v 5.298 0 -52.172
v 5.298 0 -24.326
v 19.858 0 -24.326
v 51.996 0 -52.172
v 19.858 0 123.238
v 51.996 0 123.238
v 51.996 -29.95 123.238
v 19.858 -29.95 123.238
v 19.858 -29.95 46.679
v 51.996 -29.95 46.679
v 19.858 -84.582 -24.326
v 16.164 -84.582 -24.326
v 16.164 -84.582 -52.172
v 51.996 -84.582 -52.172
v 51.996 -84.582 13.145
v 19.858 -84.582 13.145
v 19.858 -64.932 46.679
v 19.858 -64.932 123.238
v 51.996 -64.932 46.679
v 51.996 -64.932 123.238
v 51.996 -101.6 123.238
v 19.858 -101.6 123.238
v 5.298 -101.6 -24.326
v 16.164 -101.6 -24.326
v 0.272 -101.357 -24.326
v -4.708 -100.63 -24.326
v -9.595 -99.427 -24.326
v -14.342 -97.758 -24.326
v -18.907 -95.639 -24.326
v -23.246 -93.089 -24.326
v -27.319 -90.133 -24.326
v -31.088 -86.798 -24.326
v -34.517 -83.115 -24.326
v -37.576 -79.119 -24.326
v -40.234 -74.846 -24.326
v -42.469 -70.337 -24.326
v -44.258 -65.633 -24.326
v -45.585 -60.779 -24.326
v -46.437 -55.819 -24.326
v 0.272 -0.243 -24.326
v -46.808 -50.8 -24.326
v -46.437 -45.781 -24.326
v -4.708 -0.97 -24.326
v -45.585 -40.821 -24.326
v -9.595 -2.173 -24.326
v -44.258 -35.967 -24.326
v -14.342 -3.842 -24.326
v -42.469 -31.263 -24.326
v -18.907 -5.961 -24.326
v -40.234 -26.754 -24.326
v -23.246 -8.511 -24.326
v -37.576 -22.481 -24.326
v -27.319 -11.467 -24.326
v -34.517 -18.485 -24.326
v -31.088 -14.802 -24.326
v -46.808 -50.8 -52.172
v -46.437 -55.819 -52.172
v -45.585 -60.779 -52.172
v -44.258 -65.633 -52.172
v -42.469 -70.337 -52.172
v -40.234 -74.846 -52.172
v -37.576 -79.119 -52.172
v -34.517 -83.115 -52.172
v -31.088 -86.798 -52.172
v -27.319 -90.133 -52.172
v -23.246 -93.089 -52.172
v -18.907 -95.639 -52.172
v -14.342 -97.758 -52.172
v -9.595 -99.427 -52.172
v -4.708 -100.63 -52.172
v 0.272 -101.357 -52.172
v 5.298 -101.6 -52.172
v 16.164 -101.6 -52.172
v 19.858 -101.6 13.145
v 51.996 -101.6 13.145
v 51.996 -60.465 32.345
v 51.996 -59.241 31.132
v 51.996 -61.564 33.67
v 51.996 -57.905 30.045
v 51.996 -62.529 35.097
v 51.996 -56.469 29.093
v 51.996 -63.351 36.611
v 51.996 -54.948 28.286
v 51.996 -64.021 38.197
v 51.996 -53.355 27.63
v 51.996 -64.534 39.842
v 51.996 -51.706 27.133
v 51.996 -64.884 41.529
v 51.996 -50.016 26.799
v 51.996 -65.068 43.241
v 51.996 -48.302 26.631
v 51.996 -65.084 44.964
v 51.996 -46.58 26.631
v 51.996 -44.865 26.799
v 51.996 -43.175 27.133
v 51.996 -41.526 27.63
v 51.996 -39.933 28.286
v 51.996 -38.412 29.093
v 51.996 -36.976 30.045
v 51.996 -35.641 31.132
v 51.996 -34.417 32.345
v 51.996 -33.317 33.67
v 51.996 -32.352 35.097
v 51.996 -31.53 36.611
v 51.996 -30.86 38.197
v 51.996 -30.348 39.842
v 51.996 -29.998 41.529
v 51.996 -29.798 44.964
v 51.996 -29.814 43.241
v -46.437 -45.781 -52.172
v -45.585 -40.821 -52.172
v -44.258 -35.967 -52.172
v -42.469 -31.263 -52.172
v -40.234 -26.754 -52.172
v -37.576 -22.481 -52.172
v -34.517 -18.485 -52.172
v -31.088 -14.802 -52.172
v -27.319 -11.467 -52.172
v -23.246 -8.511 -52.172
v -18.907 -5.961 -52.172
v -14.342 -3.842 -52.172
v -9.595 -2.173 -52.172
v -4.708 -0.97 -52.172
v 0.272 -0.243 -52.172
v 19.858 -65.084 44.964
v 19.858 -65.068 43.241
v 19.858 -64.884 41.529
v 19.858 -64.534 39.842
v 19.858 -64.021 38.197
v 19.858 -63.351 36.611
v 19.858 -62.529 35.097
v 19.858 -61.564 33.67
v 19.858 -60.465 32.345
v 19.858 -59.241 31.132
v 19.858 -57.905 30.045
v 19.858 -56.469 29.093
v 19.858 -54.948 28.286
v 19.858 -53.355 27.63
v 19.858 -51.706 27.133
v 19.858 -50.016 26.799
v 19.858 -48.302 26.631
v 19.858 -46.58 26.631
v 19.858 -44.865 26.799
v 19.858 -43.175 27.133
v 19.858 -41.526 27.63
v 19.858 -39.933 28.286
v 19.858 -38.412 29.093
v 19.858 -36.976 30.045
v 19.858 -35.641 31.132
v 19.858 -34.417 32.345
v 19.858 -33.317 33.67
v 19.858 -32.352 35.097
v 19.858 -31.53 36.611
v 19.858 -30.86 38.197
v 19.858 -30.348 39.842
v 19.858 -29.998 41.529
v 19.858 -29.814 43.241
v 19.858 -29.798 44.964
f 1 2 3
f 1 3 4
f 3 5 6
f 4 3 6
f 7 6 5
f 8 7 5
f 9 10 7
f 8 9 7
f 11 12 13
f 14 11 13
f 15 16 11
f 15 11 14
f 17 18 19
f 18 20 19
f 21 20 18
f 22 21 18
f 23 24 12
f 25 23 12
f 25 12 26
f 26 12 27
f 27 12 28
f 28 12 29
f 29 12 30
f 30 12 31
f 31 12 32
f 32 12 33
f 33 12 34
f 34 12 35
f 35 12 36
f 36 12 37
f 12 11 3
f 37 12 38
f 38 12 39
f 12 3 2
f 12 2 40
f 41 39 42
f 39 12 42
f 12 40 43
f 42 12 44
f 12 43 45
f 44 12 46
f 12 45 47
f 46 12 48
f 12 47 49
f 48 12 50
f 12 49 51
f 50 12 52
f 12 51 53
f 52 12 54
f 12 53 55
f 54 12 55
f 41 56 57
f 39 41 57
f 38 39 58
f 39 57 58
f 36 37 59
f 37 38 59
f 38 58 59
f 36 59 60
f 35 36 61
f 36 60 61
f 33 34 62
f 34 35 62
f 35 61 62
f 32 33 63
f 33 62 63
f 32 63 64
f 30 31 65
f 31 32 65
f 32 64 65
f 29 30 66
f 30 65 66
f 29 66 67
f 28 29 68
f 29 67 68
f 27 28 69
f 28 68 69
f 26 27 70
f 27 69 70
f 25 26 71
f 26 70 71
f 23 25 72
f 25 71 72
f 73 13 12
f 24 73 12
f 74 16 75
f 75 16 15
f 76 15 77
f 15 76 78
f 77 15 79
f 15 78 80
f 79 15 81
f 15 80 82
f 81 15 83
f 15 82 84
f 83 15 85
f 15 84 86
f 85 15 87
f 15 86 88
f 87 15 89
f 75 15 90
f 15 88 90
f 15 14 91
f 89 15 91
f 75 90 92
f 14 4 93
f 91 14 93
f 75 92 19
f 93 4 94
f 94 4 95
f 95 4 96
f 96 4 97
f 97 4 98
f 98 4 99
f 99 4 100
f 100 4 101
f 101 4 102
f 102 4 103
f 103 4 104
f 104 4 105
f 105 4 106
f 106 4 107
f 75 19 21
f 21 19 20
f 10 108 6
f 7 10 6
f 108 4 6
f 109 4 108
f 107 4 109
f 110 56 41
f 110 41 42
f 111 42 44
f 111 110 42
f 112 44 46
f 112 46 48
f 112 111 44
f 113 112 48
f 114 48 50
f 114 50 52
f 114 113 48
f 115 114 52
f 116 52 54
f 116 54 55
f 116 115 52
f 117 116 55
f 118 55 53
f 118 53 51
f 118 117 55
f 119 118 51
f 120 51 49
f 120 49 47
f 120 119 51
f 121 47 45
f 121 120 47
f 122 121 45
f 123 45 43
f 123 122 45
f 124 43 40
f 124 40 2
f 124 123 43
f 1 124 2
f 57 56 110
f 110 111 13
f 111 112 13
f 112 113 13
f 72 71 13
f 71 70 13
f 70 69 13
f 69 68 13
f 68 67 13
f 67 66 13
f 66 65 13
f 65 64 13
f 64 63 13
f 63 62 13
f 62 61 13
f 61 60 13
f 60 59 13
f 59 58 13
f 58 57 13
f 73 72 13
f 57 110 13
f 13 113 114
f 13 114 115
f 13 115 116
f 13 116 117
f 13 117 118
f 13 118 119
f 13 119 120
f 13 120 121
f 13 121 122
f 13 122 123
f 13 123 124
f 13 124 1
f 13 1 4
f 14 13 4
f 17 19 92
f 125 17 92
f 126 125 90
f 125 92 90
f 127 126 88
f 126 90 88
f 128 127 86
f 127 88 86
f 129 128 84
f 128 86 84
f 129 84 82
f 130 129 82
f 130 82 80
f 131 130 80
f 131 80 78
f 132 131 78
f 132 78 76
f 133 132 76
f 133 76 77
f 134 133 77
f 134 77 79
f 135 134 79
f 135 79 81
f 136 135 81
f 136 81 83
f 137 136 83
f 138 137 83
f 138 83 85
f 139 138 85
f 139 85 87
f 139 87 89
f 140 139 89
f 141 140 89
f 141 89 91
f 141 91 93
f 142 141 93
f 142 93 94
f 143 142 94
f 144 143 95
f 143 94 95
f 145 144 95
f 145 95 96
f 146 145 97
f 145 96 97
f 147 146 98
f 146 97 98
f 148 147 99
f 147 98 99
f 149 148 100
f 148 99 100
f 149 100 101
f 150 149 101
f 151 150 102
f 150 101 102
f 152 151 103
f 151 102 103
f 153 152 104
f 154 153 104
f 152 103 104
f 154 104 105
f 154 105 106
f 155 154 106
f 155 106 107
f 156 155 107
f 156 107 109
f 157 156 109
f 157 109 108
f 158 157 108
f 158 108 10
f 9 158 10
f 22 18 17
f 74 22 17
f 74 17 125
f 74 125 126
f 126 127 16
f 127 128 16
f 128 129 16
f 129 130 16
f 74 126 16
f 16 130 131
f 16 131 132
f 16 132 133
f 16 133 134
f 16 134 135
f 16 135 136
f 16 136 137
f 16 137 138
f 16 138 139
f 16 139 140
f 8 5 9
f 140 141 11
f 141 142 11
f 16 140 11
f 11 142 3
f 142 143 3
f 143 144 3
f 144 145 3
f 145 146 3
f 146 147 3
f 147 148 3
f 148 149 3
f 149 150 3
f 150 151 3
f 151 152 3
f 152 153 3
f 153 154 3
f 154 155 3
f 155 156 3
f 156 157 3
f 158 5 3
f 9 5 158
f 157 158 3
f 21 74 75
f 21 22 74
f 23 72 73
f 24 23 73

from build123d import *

# Parameters (mm, degrees)
F1_DEPTH    = 101.6
F2_T1_DEPTH = 288.460768654
F4_START    = 84.582
F3_W        = 46.8034986407
F3_H        = 78.1666617841
F4_DEPTH    = 39.37
F6_DEPTH    = 76.2


# Not quite as in the source:
# - a fillet or chamfer that OpenCascade refuses, or shapes differently, is made with other operations: its cross-section is extruded or revolved along the edge and cut away or added


with BuildPart() as f1:
    # F0 (on Front) → F1 (new body)
    with BuildSketch(Plane.XZ):
        Polygon((-46.8246676028, -52.1724224091), (51.9963987172, -52.1724224091), (51.9963987172, 123.2375688851), (19.8580101132, 123.2375688851), (19.8580101132, -24.3260078132), (-46.8246676028, -24.3260078132), align=None)
    extrude(amount=F1_DEPTH)

    # F2: fillet of radius 52.1228708116 on 2 edges, made by hand

    # F2_s2 → F2_t1 (cut)
    with BuildSketch(Plane.XY.offset(-182.4795994381)):
        with BuildLine():
            ThreePointArc((-46.8246676028, -52.1228708116), (-31.558232197, -15.2664354058), (5.2982032089, 0))
            Line((5.2982032089, 0), (-46.8246676028, 0))
            Line((-46.8246676028, 0), (-46.8246676028, -52.1228708116))
        make_face()
        with BuildLine():
            ThreePointArc((-46.8246676028, -49.4771291884), (-31.558232197, -86.3335645942), (5.2982032089, -101.6))
            Line((5.2982032089, -101.6), (-46.8246676028, -101.6))
            Line((-46.8246676028, -101.6), (-46.8246676028, -49.4771291884))
        make_face()
    extrude(amount=F2_T1_DEPTH, mode=Mode.SUBTRACT)

    # F3 (on Front) → F4 (cut)
    with BuildSketch(Plane.XZ.offset(F4_START)):
        with Locations((39.5658416674, -25.9385192767)):
            Rectangle(F3_W, F3_H)
    extrude(amount=F4_DEPTH, mode=Mode.SUBTRACT)

    # F5 (on Right) → F6 (cut, symmetric)
    with BuildSketch(Plane.YZ):
        with BuildLine():
            Line((-29.9497395754, 125.8109509945), (-64.9317279458, 125.8109509945))
            Line((-64.9317279458, 125.8109509945), (-64.9317279458, 46.6792732477))
            ThreePointArc((-64.9317279458, 46.6792732477), (-47.4407337606, 61.9233160809), (-29.9497395754, 46.6792732477))
            Line((-29.9497395754, 46.6792732477), (-29.9497395754, 125.8109509945))
        make_face()
        with BuildLine():
            ThreePointArc((-29.9497395754, 46.6792732477), (-47.4407337606, 61.9233160809), (-64.9317279458, 46.6792732477))
            ThreePointArc((-64.9317279458, 46.6792732477), (-48.6498471956, 26.6515784611), (-29.7841407761, 44.2667230964))
            ThreePointArc((-29.7841407761, 44.2667230964), (-29.8255891253, 45.4758365314), (-29.9497395754, 46.6792732477))
        make_face()
    extrude(amount=F6_DEPTH, both=True, mode=Mode.SUBTRACT)


solid = f1.part
